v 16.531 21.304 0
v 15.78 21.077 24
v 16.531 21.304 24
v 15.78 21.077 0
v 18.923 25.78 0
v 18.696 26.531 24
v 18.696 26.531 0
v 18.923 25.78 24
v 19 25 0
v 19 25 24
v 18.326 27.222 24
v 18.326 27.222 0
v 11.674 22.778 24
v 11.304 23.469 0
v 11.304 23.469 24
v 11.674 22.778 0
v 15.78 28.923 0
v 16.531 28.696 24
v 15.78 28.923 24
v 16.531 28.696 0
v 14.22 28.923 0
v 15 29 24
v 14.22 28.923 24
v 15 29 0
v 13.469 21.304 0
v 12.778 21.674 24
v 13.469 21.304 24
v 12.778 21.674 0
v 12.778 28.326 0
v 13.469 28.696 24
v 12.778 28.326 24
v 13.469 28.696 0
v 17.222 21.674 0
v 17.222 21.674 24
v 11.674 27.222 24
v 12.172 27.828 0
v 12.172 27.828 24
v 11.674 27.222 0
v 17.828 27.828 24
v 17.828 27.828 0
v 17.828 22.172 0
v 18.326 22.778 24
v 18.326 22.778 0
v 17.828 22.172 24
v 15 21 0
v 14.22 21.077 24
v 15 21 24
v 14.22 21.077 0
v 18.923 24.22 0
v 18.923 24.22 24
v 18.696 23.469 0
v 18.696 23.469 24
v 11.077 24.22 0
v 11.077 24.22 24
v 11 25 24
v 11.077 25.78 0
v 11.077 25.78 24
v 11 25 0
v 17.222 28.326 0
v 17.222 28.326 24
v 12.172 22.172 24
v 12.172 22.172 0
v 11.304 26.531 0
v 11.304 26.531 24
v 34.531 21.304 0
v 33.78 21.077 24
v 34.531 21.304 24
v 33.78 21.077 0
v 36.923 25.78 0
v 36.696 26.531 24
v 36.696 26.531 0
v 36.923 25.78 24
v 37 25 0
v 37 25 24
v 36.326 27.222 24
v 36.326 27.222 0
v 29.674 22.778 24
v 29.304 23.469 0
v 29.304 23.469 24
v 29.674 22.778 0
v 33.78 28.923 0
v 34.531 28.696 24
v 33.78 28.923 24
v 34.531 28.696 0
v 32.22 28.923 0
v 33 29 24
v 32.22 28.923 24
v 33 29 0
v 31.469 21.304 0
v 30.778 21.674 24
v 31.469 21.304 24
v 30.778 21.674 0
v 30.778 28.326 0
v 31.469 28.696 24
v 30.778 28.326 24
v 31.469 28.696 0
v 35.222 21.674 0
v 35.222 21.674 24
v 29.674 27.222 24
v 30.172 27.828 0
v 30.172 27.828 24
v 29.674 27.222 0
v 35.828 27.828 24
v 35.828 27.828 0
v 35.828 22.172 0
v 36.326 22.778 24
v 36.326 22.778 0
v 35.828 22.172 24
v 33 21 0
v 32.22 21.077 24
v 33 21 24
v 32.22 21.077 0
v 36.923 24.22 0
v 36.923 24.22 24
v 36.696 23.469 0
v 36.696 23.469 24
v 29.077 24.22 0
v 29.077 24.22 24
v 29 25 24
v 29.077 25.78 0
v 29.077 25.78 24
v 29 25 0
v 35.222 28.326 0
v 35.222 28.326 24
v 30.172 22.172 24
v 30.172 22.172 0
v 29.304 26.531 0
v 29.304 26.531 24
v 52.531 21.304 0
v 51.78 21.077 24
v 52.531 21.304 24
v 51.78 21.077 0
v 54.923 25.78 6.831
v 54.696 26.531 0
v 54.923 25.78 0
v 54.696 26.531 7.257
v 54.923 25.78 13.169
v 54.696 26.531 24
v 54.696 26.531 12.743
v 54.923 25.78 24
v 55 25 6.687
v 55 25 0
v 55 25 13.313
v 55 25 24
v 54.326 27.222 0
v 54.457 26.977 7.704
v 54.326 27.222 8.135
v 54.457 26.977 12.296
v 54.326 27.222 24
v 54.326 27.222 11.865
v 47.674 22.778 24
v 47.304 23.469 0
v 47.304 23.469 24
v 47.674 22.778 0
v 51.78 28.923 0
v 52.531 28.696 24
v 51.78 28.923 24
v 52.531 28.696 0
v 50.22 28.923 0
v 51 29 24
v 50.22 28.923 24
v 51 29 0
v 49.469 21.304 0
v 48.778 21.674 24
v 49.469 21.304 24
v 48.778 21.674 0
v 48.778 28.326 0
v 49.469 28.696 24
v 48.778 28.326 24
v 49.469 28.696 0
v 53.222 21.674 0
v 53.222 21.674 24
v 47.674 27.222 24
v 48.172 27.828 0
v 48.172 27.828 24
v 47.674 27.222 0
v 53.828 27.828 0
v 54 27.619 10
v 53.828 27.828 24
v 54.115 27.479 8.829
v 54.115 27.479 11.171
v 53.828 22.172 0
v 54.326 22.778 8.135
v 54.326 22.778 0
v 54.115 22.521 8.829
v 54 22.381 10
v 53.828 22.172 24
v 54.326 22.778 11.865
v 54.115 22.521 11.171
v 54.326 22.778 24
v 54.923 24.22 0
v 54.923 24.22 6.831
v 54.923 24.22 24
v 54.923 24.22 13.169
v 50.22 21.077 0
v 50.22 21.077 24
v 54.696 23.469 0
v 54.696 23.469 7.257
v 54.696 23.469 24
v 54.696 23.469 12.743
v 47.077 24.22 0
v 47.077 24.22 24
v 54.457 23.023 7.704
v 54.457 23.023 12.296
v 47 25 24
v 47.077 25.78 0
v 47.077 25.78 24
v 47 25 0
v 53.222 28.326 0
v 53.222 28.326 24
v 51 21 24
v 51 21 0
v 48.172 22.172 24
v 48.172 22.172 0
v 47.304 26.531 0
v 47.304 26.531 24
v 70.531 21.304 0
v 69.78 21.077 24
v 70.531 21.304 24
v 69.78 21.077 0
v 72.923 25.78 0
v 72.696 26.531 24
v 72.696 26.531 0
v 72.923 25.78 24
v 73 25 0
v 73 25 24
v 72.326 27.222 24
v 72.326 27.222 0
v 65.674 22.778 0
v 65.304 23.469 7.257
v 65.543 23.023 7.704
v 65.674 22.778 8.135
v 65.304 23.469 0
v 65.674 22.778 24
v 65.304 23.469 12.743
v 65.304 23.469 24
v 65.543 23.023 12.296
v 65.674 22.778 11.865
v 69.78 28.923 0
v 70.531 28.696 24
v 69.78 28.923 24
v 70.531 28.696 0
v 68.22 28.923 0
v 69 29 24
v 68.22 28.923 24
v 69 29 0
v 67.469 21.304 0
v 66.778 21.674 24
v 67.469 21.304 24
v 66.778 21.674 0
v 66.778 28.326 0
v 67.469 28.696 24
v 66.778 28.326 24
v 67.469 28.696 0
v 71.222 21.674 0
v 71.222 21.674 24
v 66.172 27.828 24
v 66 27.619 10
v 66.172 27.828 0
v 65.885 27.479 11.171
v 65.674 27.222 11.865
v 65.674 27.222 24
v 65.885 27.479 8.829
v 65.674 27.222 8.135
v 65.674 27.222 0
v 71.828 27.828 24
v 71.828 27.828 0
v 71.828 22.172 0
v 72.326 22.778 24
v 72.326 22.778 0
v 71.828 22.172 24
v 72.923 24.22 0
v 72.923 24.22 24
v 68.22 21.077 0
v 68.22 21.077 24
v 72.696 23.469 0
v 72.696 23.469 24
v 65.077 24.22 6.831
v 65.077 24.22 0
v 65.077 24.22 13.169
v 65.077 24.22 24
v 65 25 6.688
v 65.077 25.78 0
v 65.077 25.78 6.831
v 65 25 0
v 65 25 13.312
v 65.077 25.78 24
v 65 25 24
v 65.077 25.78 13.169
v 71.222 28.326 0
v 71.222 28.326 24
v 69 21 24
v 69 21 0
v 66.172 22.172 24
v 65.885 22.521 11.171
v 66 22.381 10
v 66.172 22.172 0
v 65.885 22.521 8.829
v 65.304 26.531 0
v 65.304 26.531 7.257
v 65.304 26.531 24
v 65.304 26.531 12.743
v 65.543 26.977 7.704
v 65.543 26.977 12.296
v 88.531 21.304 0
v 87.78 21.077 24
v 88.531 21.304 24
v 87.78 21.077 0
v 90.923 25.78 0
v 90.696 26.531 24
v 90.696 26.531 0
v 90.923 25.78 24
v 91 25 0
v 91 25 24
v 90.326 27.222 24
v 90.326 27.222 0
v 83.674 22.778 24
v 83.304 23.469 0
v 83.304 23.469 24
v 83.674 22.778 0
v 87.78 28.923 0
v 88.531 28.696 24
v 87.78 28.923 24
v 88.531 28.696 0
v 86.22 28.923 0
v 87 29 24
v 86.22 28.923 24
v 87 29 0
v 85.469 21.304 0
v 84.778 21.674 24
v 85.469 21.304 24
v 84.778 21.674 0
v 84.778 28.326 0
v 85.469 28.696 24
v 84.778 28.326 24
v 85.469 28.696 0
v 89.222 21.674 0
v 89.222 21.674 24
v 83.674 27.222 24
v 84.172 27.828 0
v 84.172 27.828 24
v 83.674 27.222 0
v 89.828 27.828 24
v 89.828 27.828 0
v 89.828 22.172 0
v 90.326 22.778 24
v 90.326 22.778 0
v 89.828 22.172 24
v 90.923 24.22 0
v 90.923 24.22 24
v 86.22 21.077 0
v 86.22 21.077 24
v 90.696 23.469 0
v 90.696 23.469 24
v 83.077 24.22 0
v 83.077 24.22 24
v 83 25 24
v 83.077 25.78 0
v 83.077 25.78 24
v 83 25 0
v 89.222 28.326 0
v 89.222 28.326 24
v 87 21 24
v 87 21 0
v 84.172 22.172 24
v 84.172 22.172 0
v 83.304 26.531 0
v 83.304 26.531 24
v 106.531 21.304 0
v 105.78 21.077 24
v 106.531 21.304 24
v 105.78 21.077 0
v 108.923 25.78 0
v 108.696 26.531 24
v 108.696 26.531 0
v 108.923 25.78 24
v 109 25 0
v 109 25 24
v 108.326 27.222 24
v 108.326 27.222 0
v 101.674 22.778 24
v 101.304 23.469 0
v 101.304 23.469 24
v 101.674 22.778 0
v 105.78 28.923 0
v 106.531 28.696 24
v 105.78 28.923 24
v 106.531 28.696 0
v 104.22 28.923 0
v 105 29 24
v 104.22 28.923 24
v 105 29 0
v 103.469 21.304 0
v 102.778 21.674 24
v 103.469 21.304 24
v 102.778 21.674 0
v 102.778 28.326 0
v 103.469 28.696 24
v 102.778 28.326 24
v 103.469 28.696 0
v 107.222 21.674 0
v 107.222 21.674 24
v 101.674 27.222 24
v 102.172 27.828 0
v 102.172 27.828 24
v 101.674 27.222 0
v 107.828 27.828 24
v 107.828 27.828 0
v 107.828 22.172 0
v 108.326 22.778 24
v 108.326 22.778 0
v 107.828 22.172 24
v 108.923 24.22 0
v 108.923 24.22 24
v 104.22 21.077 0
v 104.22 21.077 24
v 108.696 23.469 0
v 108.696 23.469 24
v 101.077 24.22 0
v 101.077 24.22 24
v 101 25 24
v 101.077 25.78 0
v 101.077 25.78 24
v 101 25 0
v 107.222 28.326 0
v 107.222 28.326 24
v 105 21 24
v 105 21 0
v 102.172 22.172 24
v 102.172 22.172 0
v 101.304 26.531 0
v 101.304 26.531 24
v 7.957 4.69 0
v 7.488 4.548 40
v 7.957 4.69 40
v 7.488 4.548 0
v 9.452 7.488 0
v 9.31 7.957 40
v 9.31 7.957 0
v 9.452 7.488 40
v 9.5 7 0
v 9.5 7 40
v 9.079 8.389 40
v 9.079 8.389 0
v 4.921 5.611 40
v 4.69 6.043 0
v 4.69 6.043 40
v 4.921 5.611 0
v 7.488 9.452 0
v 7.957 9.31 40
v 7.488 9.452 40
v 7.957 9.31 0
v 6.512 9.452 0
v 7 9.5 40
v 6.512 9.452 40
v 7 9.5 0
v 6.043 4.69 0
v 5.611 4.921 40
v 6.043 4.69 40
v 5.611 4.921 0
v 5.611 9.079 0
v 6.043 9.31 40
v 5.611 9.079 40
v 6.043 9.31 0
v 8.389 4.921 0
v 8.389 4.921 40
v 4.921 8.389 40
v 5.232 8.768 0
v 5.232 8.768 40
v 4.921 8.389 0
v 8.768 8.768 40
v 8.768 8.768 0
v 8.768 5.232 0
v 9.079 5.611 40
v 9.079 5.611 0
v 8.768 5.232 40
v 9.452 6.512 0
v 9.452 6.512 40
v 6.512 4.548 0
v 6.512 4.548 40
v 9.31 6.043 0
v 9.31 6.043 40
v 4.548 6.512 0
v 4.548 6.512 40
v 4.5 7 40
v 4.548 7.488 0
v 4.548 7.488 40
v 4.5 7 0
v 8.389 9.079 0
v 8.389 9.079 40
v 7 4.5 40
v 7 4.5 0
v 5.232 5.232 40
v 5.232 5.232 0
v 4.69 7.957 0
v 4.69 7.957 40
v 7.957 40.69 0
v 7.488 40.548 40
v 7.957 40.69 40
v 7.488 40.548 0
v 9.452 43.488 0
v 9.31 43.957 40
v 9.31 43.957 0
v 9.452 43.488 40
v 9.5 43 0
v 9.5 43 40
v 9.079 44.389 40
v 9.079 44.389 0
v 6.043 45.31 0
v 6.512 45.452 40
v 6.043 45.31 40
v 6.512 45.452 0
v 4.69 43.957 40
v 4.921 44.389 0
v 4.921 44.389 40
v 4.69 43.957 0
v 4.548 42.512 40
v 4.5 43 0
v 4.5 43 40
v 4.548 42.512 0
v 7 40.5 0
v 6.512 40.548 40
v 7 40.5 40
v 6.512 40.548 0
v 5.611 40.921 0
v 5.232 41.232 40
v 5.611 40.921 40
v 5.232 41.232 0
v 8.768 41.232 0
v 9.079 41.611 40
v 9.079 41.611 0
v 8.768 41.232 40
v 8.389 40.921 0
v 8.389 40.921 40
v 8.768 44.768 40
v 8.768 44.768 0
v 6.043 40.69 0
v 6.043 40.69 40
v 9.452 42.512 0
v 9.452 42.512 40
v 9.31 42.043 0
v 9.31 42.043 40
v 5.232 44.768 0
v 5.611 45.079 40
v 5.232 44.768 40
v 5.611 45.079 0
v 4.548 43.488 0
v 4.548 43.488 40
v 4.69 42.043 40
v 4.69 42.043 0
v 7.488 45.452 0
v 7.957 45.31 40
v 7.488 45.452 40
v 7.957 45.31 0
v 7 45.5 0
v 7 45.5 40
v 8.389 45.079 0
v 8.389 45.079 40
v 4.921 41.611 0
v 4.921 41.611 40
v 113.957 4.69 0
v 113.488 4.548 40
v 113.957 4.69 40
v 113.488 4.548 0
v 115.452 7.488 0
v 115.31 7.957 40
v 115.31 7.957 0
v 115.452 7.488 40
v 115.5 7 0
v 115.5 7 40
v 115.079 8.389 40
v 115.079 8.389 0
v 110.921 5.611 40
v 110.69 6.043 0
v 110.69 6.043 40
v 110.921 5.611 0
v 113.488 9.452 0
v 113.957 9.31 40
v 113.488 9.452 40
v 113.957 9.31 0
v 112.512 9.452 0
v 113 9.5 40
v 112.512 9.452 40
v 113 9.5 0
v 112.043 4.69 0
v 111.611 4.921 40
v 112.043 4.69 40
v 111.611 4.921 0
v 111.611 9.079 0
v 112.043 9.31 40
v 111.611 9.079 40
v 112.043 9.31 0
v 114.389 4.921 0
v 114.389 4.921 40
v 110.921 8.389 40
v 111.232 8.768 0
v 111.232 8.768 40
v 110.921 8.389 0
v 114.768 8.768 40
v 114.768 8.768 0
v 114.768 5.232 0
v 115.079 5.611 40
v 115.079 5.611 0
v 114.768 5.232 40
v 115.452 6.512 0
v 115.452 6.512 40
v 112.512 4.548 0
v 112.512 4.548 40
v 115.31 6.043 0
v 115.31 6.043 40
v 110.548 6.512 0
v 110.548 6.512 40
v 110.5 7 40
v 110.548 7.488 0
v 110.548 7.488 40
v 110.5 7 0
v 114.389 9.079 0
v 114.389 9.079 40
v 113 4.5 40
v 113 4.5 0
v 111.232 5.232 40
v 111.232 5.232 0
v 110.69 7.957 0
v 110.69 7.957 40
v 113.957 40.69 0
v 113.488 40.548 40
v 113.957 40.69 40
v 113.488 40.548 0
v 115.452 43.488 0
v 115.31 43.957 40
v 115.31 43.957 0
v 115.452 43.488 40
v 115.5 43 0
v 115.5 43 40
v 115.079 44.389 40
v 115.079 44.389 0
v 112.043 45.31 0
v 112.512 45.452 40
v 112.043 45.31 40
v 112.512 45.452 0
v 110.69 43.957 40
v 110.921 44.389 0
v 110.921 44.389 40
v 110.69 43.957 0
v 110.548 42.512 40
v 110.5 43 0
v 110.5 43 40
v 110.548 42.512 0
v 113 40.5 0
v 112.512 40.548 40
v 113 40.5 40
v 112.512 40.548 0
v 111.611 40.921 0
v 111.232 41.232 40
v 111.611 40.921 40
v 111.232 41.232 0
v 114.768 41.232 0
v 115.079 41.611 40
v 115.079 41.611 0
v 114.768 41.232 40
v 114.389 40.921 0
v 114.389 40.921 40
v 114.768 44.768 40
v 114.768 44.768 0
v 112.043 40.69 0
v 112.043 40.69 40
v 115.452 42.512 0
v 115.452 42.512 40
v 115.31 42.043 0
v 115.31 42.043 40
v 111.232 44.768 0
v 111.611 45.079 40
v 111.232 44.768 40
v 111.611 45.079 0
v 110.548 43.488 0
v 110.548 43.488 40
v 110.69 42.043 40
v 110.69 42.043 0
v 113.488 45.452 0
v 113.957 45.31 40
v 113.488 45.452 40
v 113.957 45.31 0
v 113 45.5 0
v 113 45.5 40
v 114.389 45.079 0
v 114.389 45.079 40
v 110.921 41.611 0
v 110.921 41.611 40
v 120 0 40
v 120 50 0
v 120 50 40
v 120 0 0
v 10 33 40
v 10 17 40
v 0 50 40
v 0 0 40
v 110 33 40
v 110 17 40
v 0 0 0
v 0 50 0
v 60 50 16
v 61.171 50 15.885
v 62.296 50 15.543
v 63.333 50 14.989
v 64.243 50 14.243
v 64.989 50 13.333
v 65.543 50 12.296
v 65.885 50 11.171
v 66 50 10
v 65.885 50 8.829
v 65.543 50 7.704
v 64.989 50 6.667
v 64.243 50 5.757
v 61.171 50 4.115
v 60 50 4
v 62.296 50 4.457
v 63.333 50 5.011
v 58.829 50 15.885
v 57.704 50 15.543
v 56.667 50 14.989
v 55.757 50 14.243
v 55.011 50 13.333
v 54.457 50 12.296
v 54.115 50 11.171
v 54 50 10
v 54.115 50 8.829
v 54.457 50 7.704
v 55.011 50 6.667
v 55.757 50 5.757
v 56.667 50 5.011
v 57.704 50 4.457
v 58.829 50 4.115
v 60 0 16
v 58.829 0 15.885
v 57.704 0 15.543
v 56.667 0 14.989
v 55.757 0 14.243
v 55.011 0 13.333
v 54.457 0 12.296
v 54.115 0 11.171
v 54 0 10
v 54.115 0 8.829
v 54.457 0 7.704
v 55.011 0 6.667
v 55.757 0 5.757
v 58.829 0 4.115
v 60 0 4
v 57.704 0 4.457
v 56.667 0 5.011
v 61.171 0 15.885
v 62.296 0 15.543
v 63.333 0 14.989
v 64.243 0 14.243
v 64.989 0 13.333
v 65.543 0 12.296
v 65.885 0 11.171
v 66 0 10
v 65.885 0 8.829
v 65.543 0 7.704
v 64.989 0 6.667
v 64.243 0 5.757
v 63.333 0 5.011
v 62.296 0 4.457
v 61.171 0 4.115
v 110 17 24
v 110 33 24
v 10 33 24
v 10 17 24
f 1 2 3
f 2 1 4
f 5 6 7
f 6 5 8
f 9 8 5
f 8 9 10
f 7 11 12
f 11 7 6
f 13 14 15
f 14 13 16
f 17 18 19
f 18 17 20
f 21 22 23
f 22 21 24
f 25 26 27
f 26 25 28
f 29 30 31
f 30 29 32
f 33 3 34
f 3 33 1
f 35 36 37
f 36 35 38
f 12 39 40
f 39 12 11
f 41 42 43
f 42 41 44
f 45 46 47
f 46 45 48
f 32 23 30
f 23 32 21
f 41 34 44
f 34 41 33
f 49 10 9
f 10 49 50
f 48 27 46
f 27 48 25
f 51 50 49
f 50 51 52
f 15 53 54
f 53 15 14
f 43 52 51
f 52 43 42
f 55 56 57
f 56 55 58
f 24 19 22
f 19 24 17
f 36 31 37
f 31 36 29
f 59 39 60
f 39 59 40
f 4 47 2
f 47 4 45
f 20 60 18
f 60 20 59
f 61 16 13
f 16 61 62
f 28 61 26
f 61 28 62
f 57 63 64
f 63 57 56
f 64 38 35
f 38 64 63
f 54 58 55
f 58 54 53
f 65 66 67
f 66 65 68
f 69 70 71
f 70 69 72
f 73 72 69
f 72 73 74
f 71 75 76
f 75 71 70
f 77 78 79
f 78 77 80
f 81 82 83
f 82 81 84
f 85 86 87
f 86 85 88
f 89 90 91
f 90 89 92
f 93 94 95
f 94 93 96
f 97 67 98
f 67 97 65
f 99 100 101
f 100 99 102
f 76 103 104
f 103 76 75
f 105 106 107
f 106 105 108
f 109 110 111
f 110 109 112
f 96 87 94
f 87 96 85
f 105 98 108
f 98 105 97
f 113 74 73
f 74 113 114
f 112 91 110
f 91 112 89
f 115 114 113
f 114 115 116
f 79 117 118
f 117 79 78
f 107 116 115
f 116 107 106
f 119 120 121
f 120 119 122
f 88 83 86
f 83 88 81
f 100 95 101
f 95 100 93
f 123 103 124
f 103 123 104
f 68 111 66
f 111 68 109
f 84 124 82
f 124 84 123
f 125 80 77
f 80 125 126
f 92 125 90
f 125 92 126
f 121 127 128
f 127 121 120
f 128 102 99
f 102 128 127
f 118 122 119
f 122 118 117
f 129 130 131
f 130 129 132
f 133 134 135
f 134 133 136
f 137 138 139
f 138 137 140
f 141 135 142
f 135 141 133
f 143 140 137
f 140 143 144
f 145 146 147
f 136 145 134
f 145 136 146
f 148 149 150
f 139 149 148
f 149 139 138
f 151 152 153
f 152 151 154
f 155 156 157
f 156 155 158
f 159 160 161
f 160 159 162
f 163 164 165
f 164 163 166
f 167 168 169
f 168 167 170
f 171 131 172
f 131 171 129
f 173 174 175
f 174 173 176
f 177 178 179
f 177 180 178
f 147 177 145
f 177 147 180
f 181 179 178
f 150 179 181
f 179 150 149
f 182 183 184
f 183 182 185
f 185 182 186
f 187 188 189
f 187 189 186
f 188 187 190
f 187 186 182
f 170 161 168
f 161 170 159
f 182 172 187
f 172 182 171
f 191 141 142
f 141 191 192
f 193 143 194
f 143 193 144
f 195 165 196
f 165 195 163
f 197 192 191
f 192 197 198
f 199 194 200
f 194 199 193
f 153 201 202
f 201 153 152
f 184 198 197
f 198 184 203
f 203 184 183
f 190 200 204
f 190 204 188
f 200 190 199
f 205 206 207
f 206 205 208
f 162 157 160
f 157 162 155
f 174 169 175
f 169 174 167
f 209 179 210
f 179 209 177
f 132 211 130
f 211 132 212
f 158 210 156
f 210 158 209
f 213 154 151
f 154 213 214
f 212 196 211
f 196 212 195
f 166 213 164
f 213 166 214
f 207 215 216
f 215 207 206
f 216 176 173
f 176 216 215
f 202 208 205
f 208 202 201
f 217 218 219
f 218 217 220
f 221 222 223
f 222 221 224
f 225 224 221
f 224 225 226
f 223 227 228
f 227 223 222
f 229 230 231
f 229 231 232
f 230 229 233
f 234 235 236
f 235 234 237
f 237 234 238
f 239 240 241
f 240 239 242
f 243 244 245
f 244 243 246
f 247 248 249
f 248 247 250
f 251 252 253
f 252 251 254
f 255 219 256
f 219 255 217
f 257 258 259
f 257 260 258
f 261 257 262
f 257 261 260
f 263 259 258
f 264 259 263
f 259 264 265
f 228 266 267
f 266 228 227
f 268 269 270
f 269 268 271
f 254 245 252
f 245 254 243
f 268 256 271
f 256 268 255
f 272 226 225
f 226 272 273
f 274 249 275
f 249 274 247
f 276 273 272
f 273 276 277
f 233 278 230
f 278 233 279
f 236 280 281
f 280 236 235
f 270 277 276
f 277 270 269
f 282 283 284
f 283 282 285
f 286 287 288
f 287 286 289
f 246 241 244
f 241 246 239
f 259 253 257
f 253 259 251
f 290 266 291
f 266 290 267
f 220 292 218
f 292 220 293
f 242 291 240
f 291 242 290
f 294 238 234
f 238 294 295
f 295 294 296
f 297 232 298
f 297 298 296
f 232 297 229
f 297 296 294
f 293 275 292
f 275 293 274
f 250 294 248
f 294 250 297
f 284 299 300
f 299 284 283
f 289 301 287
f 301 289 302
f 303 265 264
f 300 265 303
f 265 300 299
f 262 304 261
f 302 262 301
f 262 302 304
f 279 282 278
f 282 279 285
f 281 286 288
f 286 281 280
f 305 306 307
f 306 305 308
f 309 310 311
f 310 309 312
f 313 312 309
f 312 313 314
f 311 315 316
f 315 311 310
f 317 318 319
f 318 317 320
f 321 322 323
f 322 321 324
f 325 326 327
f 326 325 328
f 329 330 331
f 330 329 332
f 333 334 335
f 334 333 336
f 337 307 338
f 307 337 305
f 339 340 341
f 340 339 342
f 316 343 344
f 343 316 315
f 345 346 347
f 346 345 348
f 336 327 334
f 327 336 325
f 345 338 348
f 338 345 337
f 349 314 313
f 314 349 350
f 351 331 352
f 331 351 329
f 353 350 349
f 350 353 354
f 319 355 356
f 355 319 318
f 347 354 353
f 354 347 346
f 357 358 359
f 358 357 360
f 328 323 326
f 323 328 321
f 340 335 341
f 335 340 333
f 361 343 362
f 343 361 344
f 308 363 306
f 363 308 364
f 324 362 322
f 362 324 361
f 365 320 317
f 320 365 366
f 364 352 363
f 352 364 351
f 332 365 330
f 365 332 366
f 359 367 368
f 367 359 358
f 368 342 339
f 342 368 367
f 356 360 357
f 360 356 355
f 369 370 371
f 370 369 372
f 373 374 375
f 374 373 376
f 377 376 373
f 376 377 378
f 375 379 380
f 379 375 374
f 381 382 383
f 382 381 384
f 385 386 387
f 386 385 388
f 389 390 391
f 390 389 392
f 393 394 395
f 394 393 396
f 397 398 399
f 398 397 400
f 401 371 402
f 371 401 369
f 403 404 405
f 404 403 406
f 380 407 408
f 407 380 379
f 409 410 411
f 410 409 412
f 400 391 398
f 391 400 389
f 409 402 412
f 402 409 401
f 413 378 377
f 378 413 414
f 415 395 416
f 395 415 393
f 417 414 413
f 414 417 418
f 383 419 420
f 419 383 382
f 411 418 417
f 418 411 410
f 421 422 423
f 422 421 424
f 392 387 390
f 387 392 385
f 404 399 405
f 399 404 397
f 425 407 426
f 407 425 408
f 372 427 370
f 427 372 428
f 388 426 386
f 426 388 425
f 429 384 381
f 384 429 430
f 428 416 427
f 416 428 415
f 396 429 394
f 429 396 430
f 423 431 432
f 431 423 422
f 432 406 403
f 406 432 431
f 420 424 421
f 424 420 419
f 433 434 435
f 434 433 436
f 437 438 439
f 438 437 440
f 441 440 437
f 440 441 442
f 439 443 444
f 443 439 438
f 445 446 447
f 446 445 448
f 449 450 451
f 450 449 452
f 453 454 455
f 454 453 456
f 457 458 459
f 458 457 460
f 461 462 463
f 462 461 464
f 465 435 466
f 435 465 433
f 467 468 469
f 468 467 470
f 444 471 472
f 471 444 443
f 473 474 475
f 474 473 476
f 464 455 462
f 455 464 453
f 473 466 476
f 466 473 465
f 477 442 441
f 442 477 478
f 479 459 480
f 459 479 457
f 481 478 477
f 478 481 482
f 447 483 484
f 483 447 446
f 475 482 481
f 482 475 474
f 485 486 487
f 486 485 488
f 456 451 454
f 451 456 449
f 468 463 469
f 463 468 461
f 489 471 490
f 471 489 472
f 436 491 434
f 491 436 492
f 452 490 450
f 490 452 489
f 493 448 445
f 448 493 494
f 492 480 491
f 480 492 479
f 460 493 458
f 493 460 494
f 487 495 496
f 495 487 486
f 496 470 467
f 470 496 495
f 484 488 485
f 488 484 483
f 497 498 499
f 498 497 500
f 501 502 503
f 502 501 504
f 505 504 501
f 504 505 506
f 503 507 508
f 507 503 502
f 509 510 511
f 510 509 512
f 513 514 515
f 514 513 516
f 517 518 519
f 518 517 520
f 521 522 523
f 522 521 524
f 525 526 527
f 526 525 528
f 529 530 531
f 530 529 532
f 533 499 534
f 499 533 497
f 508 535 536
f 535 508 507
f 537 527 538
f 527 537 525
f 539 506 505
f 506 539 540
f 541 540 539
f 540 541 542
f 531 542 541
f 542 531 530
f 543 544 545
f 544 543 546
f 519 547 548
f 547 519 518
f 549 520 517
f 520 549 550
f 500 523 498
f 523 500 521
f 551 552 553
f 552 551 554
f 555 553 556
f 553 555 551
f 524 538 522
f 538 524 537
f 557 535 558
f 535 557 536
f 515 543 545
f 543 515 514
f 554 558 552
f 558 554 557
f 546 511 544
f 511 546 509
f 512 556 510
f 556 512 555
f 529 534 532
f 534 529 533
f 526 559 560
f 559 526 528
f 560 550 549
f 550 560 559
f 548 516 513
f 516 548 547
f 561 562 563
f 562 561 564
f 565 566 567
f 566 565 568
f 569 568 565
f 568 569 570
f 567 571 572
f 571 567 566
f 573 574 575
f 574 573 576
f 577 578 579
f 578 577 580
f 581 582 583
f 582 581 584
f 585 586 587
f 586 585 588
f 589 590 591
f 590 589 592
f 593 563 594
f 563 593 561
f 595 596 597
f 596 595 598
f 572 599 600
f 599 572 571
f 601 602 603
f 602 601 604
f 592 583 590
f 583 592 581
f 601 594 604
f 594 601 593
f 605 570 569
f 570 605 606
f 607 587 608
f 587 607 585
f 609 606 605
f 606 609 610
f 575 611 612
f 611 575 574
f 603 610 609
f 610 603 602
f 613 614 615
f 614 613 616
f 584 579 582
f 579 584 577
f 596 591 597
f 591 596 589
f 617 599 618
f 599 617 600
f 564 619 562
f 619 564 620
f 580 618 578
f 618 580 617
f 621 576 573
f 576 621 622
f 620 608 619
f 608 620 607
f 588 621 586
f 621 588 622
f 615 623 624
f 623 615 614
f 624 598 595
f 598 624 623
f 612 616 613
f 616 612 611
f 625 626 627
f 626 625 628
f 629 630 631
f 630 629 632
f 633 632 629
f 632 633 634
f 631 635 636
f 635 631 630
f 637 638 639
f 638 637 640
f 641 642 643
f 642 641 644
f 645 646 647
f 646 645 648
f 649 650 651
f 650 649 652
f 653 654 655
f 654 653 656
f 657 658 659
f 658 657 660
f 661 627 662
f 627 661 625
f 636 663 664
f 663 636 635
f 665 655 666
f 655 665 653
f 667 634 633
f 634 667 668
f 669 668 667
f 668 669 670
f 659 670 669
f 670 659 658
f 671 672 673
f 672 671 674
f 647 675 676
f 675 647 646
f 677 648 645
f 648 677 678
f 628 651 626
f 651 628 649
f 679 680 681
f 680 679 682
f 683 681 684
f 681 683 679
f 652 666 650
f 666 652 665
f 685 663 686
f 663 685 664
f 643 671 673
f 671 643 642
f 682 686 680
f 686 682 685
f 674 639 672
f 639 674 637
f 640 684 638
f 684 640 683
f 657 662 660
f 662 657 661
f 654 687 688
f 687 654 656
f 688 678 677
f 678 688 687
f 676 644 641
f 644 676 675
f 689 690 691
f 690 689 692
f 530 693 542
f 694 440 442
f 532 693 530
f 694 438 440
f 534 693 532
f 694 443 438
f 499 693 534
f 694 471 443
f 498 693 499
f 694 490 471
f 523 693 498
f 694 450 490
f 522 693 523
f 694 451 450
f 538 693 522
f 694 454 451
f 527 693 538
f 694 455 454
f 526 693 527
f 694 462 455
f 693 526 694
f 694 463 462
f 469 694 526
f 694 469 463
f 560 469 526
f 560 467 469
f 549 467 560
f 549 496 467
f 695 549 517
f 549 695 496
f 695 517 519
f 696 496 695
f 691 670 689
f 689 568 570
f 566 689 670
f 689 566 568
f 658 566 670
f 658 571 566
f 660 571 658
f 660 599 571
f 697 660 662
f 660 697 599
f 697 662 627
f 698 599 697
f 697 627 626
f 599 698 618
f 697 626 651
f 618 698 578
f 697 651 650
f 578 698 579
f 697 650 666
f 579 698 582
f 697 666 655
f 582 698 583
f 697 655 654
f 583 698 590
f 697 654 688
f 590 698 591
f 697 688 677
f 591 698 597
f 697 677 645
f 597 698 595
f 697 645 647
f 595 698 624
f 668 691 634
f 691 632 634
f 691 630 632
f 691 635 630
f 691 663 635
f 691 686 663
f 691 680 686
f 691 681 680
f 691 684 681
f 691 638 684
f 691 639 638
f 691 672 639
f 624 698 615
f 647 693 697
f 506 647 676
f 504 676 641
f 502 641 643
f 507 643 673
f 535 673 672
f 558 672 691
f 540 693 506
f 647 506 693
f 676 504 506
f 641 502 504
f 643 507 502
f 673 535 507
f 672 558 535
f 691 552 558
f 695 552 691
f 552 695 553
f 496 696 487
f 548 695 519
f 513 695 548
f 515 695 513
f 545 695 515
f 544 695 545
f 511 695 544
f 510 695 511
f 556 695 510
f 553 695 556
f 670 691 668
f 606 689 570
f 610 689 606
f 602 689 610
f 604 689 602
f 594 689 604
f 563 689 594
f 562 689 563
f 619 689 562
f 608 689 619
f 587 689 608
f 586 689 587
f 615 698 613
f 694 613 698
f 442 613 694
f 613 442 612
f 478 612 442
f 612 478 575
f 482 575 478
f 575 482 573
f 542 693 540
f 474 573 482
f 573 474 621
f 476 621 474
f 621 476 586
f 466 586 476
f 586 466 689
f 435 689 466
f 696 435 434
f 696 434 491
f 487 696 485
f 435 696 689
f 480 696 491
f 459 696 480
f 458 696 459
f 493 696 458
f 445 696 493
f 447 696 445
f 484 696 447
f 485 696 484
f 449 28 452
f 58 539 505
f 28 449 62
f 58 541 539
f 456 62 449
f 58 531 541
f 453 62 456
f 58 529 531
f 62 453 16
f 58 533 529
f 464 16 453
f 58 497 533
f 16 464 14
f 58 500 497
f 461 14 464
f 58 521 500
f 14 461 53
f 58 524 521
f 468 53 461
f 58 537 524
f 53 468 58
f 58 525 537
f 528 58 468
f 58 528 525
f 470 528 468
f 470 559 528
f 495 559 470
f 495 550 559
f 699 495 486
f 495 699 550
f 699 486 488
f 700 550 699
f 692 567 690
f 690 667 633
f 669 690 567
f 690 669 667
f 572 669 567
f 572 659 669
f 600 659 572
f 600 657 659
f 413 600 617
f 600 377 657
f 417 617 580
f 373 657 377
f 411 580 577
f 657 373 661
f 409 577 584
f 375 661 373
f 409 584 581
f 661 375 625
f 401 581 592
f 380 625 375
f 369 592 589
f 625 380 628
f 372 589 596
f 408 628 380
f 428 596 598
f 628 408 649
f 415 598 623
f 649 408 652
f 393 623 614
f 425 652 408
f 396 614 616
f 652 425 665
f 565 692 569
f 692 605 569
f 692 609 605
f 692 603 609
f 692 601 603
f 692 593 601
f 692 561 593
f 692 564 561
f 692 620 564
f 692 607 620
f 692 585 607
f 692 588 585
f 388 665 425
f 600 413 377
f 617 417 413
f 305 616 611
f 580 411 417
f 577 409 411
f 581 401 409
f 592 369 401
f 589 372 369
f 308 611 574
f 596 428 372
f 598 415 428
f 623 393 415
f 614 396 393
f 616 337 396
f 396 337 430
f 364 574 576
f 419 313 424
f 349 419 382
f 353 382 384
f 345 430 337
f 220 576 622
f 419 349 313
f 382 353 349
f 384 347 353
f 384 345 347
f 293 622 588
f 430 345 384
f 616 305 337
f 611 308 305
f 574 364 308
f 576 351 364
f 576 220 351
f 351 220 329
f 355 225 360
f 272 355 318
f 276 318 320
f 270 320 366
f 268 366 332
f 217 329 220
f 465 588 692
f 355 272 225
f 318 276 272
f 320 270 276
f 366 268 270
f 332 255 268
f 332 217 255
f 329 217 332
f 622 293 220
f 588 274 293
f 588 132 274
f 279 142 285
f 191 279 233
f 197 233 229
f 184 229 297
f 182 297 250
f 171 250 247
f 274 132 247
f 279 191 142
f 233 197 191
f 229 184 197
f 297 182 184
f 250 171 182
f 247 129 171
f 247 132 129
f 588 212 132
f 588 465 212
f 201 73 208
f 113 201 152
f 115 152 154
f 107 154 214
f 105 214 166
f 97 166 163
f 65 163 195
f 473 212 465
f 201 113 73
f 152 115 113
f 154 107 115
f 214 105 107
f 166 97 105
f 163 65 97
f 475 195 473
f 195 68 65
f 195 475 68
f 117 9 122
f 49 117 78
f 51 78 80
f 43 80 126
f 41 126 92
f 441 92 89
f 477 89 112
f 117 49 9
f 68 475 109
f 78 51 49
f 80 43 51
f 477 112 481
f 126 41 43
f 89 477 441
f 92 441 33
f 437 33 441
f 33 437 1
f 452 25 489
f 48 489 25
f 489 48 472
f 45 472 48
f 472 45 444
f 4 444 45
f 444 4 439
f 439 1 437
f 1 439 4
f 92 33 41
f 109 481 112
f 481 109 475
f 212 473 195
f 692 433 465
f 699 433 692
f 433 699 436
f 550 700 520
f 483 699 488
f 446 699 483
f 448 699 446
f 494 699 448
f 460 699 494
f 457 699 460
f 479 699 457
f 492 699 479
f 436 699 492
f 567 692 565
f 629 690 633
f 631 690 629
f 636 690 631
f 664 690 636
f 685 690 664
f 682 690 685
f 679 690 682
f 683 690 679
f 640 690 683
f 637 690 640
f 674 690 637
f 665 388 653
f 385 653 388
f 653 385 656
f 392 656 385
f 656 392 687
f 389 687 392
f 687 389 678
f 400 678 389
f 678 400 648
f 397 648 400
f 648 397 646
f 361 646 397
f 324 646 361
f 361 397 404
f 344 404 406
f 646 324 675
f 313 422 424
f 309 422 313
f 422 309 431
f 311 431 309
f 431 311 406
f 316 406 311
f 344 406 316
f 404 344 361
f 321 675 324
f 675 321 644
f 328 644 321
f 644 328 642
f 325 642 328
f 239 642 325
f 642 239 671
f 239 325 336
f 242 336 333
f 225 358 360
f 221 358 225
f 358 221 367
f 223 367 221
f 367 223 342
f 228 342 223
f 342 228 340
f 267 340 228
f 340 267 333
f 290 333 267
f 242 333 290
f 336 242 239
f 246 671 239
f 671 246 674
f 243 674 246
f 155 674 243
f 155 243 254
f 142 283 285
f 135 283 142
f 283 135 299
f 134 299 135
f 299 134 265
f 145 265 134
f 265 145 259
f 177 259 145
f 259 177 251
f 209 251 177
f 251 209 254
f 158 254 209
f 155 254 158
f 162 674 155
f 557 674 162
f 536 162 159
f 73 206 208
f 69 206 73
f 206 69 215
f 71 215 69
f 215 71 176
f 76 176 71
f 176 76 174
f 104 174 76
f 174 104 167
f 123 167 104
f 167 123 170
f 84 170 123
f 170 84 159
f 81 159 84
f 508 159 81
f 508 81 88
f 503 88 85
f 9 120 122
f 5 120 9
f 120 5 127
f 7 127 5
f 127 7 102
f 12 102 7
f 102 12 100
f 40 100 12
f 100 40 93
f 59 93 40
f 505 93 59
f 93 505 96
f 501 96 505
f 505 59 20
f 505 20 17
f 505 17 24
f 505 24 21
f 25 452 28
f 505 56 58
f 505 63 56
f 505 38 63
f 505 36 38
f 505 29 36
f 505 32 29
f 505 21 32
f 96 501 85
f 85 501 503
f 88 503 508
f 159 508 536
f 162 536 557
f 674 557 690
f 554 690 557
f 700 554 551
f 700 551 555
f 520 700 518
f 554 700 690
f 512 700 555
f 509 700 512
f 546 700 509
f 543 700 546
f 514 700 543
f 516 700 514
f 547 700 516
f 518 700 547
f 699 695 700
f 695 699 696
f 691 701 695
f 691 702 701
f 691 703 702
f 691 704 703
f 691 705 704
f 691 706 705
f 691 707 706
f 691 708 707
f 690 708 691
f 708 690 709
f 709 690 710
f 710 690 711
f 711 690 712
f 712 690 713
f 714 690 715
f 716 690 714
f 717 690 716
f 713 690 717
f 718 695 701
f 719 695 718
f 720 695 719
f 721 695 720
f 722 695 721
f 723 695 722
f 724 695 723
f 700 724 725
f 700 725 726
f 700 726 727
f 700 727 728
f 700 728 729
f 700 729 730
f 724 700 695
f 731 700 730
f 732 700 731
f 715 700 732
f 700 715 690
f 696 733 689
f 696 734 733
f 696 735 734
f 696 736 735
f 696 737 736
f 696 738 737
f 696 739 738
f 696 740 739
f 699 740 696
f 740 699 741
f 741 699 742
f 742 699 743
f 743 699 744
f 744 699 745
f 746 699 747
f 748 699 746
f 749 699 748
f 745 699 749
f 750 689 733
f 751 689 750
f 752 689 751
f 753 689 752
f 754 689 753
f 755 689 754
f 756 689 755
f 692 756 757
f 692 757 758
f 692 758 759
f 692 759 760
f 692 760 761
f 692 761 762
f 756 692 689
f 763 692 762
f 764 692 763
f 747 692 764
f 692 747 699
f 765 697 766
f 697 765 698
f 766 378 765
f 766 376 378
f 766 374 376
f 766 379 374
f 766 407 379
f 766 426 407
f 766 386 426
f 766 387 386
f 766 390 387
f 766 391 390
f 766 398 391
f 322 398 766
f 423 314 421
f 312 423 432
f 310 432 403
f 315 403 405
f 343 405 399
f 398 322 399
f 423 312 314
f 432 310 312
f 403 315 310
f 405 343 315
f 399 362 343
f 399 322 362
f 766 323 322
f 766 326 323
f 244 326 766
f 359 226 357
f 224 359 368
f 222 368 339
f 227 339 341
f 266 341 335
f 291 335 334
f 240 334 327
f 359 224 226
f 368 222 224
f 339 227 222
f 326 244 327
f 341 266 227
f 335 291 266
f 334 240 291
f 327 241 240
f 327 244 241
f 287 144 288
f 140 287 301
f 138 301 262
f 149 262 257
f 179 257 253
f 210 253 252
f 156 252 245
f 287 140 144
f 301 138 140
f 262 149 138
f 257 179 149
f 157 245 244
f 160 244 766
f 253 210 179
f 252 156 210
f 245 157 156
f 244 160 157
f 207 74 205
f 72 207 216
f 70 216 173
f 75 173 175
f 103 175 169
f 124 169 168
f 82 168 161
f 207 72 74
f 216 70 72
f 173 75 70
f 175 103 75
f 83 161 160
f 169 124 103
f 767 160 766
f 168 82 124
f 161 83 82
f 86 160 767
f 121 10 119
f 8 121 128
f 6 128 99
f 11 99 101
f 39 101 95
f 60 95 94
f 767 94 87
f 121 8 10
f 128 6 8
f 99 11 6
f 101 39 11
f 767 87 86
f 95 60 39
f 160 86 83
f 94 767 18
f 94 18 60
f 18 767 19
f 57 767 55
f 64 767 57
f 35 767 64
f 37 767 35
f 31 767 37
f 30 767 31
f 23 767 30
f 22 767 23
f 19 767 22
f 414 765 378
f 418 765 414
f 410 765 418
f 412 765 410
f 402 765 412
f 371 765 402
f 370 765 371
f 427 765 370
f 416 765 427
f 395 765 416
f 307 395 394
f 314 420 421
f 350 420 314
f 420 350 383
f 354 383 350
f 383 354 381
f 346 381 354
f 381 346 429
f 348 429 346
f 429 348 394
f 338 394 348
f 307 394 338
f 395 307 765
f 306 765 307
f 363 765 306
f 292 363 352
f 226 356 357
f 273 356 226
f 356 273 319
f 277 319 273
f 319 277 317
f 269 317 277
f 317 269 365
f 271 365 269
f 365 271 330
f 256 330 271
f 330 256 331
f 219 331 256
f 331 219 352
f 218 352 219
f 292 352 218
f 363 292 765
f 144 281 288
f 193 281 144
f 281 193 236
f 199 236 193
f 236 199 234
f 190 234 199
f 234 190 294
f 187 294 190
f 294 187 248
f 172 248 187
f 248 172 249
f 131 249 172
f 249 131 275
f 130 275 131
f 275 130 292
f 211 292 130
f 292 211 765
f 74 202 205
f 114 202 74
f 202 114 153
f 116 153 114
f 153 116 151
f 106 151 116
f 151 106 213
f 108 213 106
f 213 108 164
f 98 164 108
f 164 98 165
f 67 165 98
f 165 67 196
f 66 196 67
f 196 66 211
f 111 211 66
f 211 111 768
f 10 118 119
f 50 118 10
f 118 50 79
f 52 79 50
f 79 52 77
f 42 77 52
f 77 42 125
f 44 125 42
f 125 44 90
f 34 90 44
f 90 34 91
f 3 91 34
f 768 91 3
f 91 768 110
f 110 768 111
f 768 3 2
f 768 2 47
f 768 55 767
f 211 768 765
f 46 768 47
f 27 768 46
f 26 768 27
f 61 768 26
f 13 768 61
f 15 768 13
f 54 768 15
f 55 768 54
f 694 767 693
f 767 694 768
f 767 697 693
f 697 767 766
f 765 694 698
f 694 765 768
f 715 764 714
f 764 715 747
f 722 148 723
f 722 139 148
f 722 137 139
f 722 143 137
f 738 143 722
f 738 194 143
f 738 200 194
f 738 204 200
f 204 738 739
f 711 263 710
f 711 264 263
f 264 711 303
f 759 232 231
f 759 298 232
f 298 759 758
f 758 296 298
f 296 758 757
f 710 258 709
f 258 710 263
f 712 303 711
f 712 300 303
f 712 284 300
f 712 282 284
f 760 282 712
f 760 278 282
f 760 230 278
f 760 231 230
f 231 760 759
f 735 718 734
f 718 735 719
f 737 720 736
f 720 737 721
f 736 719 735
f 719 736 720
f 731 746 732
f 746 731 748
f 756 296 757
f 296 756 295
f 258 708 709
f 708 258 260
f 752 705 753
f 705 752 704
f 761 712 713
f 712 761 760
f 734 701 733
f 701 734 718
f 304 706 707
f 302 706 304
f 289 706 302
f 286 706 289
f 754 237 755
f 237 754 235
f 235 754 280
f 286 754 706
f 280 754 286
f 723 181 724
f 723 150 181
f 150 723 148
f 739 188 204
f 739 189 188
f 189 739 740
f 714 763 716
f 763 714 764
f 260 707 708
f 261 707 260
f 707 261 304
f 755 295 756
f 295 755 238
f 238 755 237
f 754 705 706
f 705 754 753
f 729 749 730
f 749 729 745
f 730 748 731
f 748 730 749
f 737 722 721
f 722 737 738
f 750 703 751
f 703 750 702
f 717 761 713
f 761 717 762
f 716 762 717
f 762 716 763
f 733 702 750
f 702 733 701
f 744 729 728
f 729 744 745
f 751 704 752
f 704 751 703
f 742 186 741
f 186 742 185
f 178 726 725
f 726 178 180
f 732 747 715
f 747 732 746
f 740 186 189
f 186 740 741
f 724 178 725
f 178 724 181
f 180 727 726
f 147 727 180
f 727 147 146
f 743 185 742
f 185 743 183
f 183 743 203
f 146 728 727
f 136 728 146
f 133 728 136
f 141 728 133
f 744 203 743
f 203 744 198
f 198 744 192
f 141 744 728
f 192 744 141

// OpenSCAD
$fn = 32;

// ----------------------------------------------------------------------
// Manifold block: side_outlet manifold
// ----------------------------------------------------------------------

// --- parameters (mm) ---
block_l = 120;            // block length, X
block_w = 50;             // block width, Y
block_h = 40;             // block height, Z
port_d = 8;               // port bore diameter
port_pitch = 18;          // port pitch along X
gallery_d = 16;           // top gallery width, Y
gallery_depth = 16;       // gallery pocket depth
wall_p = 10;              // gallery end wall thickness, X
mnt_d = 5;                // mounting hole diameter
mnt_in = 7;               // mounting hole inset from the edges
out_d = 12;               // outlet bore diameter
out_z = 10;               // outlet axis height
fit_tol = 0.1;            // tolerance for press fits, mm
free_tol = 0.5;           // tolerance for clearance fits, mm

n_ports = 6;  // ports in the row
port_x0 = (block_l - (n_ports - 1) * port_pitch) / 2;  // first port X

difference() {
  cube([block_l, block_w, block_h]);
  for (i = [0 : n_ports - 1])
    translate([port_x0 + i * port_pitch, block_w / 2, -1])
      cylinder(h = block_h + 2, d = port_d);
  translate([wall_p, block_w / 2 - gallery_d / 2, block_h - gallery_depth])
    cube([block_l - 2 * wall_p, gallery_d, gallery_depth + 1]);
  for (cx = [mnt_in, block_l - mnt_in])
    for (cy = [mnt_in, block_w - mnt_in])
      translate([cx, cy, -1]) cylinder(h = block_h + 2, d = mnt_d);
  translate([block_l / 2, -1, out_z]) rotate([-90, 0, 0])
    cylinder(h = block_w + 2, d = out_d);
}
